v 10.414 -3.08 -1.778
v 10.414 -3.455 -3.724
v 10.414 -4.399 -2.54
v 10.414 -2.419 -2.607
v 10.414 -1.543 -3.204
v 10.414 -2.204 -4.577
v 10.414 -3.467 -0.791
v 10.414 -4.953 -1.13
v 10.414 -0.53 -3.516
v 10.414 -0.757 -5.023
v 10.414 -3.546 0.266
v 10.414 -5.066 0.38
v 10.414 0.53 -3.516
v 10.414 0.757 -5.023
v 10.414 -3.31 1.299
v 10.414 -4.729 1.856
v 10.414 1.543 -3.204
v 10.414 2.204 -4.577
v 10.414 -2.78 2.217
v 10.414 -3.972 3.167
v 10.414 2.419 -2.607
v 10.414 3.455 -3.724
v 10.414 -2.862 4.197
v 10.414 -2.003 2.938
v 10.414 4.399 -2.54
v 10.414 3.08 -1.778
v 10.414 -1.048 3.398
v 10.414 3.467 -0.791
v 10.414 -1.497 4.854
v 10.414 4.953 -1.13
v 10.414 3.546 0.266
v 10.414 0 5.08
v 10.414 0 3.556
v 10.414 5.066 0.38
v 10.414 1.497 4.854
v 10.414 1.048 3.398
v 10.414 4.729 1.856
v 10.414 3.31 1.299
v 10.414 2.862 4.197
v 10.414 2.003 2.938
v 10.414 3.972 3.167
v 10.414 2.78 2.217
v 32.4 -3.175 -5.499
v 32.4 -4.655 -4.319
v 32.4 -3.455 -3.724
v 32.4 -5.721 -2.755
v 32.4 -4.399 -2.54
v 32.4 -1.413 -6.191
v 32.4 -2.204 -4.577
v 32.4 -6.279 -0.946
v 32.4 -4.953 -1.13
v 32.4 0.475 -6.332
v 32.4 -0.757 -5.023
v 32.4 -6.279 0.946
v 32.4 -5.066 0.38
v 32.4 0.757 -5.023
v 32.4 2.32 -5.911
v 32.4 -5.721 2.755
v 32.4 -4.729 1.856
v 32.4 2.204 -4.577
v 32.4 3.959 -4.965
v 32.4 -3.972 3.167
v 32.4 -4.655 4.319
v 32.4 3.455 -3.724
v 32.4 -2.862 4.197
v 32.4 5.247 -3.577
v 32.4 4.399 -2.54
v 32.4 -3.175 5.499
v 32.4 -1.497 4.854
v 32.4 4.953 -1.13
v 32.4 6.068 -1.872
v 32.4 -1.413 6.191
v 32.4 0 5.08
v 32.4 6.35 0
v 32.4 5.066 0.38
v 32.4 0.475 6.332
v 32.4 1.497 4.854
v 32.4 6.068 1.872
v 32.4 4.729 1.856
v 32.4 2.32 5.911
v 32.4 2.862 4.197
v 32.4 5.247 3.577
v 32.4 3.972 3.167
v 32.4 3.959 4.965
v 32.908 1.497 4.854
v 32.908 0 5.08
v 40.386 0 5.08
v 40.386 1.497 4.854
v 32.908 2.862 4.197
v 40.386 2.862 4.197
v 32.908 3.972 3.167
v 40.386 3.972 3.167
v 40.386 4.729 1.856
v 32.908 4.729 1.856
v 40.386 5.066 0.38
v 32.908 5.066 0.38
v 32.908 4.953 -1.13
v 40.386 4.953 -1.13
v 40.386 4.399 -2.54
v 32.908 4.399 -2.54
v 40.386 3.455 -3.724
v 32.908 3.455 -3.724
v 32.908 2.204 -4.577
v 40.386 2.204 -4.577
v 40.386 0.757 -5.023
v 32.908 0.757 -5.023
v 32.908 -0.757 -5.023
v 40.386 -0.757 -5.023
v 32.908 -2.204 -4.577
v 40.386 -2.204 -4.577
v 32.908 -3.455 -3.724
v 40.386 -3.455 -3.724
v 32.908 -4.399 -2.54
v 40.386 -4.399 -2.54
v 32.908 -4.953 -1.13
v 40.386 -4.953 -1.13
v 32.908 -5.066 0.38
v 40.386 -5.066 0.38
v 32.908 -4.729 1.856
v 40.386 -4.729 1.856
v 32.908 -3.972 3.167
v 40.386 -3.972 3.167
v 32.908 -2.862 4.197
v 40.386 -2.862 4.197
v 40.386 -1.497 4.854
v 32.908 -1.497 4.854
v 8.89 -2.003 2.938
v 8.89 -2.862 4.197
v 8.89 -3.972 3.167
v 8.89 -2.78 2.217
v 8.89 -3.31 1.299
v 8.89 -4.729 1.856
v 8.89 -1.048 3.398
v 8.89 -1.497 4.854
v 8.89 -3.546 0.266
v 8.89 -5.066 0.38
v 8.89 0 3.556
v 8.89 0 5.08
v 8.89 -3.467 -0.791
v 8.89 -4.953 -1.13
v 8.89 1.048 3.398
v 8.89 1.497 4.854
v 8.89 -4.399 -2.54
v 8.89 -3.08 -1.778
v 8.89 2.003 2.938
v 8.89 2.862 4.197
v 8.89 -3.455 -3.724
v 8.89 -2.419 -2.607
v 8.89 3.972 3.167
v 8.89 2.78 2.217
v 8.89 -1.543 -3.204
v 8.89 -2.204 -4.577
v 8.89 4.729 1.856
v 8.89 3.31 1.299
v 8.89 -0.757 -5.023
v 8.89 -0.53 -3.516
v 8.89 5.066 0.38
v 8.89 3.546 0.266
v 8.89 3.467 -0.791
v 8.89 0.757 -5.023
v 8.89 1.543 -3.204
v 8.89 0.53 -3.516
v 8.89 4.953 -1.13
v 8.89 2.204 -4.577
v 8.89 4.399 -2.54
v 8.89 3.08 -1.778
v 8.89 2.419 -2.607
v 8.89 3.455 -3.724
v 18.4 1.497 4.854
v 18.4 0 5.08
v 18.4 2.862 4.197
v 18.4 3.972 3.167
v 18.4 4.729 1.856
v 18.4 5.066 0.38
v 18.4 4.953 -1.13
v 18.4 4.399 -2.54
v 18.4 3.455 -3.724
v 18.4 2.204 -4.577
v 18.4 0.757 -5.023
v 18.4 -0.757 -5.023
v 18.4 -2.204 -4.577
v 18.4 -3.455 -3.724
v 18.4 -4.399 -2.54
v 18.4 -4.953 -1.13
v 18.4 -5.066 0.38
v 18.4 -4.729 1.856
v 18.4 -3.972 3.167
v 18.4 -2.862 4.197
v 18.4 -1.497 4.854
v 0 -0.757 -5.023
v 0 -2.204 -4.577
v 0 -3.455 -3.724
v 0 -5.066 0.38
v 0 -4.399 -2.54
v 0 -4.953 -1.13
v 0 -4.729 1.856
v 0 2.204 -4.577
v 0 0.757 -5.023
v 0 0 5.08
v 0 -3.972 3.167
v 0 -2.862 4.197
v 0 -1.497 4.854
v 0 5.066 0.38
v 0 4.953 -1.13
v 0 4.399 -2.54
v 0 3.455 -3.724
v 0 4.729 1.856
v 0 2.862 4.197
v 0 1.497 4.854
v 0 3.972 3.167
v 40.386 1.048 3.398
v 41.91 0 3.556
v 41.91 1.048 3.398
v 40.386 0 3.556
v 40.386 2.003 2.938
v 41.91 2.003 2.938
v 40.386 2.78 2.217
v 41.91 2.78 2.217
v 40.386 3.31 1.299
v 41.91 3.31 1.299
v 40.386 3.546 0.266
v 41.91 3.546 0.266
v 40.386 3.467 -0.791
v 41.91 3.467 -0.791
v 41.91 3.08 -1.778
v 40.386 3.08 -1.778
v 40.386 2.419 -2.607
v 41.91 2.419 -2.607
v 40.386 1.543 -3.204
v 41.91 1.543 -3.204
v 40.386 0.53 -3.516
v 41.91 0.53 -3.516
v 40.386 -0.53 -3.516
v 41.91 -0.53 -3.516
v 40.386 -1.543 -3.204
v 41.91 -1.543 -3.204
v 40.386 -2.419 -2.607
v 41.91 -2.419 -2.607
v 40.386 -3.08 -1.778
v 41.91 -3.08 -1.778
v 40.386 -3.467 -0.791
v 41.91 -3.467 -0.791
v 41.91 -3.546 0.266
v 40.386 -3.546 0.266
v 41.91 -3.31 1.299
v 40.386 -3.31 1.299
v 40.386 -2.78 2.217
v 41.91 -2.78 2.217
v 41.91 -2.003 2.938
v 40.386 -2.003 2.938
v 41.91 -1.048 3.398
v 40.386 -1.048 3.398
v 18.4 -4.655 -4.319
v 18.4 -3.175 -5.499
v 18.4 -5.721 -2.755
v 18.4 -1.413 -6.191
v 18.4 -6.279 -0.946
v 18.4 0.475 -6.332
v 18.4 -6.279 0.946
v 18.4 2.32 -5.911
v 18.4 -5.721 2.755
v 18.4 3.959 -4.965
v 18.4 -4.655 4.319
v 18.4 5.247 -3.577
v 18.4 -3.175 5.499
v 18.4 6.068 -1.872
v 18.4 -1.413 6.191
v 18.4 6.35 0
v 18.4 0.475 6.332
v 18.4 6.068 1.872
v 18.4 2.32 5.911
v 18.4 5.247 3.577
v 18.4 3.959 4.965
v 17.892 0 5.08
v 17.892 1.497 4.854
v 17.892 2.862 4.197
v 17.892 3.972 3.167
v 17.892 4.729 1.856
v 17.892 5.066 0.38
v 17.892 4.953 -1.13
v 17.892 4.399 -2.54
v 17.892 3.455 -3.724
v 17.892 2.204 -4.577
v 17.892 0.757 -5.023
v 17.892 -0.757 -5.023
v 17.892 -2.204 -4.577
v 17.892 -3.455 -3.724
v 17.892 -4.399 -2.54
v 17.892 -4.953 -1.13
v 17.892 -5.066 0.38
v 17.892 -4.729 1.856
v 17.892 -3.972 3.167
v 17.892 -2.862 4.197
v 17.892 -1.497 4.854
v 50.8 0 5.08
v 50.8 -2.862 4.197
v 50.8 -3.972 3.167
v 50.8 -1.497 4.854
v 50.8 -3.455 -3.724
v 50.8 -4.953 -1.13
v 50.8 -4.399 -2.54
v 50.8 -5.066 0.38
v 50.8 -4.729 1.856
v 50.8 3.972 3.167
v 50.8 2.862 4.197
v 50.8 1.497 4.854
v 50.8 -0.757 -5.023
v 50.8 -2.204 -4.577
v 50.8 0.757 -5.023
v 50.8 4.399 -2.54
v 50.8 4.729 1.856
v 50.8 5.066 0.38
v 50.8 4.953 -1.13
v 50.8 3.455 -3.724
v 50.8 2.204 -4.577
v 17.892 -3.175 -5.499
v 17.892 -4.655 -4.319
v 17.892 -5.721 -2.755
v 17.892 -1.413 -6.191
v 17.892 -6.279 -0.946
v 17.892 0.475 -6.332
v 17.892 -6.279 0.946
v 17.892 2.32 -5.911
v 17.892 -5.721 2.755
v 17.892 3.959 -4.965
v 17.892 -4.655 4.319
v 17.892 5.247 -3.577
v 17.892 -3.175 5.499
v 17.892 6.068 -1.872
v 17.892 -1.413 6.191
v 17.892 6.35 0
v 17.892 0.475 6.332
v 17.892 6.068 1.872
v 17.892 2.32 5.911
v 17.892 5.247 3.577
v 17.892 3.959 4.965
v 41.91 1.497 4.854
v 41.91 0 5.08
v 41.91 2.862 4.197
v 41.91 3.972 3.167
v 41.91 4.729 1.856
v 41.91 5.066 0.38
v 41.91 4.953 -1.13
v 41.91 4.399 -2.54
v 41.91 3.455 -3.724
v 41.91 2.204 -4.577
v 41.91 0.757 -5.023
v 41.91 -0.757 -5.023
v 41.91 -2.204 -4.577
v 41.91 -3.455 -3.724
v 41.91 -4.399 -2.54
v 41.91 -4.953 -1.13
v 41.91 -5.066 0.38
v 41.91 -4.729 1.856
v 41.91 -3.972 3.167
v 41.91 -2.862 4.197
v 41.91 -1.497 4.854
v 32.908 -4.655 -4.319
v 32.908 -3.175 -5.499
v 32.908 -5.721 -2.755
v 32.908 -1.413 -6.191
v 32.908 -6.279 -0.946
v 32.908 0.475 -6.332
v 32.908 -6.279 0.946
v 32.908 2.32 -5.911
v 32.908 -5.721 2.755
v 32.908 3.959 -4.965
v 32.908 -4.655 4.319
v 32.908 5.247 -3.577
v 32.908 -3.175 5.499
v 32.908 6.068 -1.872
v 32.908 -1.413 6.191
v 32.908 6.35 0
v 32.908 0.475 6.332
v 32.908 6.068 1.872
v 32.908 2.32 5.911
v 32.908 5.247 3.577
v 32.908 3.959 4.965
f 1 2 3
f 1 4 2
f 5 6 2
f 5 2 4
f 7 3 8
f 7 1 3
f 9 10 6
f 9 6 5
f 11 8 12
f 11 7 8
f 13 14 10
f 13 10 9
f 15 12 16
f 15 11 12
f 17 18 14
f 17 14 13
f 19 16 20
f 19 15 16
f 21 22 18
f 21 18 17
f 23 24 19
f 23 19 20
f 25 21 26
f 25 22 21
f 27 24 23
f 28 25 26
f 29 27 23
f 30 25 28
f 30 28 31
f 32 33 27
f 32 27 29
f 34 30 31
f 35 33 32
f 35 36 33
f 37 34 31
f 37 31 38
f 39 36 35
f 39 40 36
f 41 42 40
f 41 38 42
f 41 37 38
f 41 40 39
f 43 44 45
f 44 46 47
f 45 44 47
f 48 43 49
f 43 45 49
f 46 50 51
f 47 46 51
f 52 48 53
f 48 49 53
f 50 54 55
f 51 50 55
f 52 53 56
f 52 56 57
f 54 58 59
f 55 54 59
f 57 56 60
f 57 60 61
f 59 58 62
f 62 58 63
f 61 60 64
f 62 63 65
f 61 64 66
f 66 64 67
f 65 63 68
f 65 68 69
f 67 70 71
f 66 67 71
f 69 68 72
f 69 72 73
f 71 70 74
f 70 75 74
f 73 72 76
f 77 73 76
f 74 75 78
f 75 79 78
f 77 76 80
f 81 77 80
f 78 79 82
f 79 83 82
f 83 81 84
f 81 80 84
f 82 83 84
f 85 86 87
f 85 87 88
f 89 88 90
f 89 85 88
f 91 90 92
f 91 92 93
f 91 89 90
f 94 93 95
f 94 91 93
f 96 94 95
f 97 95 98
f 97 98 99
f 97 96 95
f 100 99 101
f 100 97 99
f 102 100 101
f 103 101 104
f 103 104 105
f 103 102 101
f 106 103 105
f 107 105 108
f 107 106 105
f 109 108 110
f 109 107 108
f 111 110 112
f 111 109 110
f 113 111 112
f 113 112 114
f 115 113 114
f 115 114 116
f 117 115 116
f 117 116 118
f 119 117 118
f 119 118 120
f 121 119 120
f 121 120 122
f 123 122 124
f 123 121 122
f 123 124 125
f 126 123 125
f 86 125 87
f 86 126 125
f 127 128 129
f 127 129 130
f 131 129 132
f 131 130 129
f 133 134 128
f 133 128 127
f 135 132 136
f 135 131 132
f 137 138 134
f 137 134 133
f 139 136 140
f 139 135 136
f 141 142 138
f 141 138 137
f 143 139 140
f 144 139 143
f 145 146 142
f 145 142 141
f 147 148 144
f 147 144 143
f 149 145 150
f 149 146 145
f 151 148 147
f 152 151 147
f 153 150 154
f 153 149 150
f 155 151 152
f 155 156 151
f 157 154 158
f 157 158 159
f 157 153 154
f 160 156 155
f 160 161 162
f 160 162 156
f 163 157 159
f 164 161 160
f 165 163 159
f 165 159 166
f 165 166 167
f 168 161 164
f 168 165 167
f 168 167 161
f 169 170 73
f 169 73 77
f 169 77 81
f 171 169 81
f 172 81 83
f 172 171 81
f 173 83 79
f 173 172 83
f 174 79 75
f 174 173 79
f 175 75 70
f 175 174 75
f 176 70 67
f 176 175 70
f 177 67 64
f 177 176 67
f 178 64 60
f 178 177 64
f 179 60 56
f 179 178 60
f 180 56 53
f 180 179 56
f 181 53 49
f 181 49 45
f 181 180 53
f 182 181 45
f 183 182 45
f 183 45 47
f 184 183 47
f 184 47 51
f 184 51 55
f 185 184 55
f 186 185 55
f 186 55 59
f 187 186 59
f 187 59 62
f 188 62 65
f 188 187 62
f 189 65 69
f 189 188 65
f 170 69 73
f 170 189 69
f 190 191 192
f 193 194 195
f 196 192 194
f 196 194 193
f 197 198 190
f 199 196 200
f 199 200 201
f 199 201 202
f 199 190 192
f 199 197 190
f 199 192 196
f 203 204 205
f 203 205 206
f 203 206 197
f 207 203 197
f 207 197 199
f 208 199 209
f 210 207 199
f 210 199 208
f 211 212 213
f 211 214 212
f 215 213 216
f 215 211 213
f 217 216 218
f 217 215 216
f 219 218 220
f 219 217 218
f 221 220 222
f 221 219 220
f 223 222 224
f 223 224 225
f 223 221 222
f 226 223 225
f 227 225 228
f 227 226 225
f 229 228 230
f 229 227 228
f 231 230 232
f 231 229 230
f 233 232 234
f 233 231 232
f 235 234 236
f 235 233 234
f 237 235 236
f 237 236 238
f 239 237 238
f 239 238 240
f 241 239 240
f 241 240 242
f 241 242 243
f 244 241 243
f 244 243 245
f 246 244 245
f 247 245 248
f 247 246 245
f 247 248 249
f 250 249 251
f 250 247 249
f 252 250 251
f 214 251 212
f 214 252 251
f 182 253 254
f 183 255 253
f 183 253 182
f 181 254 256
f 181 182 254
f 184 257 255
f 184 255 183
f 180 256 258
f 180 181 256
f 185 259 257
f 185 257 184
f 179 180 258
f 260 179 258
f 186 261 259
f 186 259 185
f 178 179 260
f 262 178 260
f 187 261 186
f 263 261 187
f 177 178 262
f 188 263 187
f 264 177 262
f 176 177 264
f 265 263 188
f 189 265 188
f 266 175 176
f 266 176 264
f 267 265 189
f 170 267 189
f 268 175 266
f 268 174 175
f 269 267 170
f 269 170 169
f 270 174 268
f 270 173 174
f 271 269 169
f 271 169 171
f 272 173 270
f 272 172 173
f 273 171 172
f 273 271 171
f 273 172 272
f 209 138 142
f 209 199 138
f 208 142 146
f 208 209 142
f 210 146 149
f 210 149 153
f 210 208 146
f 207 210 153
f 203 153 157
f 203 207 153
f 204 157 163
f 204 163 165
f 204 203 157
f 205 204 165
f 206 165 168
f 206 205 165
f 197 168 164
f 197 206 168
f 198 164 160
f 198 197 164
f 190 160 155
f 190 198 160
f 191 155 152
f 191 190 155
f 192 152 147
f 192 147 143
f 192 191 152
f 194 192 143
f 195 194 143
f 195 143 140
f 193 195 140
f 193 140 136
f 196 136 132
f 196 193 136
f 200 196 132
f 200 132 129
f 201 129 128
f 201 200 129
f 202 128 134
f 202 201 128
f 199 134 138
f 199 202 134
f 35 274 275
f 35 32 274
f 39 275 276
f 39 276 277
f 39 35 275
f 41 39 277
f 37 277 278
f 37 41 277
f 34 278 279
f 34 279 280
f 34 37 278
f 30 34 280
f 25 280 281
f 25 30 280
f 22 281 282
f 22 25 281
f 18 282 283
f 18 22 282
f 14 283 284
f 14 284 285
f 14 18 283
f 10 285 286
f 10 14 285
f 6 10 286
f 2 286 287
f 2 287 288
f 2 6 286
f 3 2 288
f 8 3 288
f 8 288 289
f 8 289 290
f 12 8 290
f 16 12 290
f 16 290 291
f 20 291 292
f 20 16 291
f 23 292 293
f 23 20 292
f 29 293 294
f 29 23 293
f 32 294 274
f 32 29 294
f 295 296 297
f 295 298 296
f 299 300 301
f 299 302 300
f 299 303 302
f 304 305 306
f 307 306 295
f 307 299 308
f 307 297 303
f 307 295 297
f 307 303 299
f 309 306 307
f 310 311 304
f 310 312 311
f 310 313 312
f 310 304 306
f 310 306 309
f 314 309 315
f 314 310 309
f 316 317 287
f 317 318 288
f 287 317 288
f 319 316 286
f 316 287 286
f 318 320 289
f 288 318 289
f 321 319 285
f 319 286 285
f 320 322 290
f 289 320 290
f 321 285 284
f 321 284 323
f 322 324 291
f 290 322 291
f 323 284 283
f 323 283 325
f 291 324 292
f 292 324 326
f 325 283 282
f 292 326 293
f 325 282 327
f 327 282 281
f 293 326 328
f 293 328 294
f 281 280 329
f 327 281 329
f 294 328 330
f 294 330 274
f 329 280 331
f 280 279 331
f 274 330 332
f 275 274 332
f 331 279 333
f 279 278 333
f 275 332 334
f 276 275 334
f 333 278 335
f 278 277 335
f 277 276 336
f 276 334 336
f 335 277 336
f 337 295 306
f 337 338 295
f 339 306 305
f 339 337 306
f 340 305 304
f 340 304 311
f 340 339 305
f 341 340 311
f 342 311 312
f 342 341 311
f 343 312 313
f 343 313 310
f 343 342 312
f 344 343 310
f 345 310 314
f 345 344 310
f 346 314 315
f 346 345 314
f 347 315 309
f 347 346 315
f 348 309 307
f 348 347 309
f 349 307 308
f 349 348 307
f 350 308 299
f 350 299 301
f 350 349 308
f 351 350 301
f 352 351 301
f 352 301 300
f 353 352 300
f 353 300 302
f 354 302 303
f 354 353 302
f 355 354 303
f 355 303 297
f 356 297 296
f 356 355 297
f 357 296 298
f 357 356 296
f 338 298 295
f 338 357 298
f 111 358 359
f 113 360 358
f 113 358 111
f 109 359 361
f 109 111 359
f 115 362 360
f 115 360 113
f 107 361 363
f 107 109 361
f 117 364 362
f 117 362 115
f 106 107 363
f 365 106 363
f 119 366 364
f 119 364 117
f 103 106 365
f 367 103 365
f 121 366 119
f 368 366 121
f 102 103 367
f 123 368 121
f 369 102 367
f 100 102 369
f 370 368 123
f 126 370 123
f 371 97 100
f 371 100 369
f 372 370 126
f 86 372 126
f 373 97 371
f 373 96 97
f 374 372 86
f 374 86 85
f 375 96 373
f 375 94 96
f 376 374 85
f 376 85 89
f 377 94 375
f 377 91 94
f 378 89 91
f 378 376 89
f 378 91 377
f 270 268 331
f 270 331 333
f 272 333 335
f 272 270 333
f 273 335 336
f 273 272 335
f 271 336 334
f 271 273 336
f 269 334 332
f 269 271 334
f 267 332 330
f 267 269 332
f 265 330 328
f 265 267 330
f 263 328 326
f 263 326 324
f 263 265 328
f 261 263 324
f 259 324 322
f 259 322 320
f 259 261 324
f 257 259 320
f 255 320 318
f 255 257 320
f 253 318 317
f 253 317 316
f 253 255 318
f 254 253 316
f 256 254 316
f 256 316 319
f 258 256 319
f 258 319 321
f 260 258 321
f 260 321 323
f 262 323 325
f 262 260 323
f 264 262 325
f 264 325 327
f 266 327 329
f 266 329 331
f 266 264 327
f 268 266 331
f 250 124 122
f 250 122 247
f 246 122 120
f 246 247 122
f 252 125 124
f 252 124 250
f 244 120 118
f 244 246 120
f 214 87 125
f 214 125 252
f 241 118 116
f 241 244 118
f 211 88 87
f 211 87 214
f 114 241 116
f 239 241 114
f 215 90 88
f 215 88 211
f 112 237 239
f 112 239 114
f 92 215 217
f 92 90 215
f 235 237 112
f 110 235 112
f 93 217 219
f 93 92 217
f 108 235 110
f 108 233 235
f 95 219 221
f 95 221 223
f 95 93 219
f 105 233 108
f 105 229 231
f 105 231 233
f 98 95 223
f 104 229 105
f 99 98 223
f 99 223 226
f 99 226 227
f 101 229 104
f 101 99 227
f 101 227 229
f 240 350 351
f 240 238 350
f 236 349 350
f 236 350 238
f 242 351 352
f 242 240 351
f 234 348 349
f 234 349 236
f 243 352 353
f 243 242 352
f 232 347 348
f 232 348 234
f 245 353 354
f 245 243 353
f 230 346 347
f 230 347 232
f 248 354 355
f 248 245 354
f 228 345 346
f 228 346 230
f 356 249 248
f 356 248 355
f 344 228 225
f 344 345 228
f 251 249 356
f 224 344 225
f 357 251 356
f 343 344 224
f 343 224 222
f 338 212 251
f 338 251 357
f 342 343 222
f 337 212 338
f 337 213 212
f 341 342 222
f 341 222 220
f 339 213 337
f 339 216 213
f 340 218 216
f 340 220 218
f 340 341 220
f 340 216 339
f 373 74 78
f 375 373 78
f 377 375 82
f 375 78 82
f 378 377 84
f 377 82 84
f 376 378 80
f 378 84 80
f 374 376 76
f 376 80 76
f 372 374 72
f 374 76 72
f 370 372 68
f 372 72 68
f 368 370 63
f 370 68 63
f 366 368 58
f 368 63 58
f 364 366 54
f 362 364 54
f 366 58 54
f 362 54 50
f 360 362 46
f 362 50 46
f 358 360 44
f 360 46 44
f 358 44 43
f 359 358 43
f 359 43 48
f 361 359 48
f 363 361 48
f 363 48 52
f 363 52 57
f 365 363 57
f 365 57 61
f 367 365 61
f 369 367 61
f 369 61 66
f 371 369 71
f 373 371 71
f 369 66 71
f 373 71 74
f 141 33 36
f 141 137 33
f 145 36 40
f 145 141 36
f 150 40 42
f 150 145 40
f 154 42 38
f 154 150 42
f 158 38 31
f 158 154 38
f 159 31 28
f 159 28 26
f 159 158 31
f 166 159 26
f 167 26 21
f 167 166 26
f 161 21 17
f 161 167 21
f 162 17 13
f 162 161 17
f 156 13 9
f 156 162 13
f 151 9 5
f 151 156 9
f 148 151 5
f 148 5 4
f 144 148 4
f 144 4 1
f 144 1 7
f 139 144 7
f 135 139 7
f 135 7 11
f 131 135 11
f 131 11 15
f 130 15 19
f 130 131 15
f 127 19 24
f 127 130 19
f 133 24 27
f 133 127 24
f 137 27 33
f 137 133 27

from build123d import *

# Parameters (mm, degrees)
F5_R     = 6.35
F6_DEPTH = 0.508
F7_R     = 6.35
F8_DEPTH = 0.508


with BuildPart() as f1:
    # F0 (on Front) → F1 (revolve)
    with BuildSketch(Plane.XZ):
        Polygon((0, 5.08), (0, 0), (50.8, 0), (50.8, 5.08), (41.91, 5.08), (41.91, 3.556), (40.386, 3.556), (40.386, 5.08), (10.414, 5.08), (10.414, 3.556), (8.89, 3.556), (8.89, 5.08), align=None)
    revolve(axis=Axis((25.4, 0, 0), (-1, 0, 0)))

    # F5 (on offset) → F6 (join)
    with BuildSketch(Plane.YZ.offset(32.4)):
        Circle(F5_R)
    extrude(amount=F6_DEPTH)

    # F7 (on offset) → F8 (join)
    with BuildSketch(Plane.YZ.offset(18.4)):
        Circle(F7_R)
    extrude(amount=-F8_DEPTH)


solid = f1.part
